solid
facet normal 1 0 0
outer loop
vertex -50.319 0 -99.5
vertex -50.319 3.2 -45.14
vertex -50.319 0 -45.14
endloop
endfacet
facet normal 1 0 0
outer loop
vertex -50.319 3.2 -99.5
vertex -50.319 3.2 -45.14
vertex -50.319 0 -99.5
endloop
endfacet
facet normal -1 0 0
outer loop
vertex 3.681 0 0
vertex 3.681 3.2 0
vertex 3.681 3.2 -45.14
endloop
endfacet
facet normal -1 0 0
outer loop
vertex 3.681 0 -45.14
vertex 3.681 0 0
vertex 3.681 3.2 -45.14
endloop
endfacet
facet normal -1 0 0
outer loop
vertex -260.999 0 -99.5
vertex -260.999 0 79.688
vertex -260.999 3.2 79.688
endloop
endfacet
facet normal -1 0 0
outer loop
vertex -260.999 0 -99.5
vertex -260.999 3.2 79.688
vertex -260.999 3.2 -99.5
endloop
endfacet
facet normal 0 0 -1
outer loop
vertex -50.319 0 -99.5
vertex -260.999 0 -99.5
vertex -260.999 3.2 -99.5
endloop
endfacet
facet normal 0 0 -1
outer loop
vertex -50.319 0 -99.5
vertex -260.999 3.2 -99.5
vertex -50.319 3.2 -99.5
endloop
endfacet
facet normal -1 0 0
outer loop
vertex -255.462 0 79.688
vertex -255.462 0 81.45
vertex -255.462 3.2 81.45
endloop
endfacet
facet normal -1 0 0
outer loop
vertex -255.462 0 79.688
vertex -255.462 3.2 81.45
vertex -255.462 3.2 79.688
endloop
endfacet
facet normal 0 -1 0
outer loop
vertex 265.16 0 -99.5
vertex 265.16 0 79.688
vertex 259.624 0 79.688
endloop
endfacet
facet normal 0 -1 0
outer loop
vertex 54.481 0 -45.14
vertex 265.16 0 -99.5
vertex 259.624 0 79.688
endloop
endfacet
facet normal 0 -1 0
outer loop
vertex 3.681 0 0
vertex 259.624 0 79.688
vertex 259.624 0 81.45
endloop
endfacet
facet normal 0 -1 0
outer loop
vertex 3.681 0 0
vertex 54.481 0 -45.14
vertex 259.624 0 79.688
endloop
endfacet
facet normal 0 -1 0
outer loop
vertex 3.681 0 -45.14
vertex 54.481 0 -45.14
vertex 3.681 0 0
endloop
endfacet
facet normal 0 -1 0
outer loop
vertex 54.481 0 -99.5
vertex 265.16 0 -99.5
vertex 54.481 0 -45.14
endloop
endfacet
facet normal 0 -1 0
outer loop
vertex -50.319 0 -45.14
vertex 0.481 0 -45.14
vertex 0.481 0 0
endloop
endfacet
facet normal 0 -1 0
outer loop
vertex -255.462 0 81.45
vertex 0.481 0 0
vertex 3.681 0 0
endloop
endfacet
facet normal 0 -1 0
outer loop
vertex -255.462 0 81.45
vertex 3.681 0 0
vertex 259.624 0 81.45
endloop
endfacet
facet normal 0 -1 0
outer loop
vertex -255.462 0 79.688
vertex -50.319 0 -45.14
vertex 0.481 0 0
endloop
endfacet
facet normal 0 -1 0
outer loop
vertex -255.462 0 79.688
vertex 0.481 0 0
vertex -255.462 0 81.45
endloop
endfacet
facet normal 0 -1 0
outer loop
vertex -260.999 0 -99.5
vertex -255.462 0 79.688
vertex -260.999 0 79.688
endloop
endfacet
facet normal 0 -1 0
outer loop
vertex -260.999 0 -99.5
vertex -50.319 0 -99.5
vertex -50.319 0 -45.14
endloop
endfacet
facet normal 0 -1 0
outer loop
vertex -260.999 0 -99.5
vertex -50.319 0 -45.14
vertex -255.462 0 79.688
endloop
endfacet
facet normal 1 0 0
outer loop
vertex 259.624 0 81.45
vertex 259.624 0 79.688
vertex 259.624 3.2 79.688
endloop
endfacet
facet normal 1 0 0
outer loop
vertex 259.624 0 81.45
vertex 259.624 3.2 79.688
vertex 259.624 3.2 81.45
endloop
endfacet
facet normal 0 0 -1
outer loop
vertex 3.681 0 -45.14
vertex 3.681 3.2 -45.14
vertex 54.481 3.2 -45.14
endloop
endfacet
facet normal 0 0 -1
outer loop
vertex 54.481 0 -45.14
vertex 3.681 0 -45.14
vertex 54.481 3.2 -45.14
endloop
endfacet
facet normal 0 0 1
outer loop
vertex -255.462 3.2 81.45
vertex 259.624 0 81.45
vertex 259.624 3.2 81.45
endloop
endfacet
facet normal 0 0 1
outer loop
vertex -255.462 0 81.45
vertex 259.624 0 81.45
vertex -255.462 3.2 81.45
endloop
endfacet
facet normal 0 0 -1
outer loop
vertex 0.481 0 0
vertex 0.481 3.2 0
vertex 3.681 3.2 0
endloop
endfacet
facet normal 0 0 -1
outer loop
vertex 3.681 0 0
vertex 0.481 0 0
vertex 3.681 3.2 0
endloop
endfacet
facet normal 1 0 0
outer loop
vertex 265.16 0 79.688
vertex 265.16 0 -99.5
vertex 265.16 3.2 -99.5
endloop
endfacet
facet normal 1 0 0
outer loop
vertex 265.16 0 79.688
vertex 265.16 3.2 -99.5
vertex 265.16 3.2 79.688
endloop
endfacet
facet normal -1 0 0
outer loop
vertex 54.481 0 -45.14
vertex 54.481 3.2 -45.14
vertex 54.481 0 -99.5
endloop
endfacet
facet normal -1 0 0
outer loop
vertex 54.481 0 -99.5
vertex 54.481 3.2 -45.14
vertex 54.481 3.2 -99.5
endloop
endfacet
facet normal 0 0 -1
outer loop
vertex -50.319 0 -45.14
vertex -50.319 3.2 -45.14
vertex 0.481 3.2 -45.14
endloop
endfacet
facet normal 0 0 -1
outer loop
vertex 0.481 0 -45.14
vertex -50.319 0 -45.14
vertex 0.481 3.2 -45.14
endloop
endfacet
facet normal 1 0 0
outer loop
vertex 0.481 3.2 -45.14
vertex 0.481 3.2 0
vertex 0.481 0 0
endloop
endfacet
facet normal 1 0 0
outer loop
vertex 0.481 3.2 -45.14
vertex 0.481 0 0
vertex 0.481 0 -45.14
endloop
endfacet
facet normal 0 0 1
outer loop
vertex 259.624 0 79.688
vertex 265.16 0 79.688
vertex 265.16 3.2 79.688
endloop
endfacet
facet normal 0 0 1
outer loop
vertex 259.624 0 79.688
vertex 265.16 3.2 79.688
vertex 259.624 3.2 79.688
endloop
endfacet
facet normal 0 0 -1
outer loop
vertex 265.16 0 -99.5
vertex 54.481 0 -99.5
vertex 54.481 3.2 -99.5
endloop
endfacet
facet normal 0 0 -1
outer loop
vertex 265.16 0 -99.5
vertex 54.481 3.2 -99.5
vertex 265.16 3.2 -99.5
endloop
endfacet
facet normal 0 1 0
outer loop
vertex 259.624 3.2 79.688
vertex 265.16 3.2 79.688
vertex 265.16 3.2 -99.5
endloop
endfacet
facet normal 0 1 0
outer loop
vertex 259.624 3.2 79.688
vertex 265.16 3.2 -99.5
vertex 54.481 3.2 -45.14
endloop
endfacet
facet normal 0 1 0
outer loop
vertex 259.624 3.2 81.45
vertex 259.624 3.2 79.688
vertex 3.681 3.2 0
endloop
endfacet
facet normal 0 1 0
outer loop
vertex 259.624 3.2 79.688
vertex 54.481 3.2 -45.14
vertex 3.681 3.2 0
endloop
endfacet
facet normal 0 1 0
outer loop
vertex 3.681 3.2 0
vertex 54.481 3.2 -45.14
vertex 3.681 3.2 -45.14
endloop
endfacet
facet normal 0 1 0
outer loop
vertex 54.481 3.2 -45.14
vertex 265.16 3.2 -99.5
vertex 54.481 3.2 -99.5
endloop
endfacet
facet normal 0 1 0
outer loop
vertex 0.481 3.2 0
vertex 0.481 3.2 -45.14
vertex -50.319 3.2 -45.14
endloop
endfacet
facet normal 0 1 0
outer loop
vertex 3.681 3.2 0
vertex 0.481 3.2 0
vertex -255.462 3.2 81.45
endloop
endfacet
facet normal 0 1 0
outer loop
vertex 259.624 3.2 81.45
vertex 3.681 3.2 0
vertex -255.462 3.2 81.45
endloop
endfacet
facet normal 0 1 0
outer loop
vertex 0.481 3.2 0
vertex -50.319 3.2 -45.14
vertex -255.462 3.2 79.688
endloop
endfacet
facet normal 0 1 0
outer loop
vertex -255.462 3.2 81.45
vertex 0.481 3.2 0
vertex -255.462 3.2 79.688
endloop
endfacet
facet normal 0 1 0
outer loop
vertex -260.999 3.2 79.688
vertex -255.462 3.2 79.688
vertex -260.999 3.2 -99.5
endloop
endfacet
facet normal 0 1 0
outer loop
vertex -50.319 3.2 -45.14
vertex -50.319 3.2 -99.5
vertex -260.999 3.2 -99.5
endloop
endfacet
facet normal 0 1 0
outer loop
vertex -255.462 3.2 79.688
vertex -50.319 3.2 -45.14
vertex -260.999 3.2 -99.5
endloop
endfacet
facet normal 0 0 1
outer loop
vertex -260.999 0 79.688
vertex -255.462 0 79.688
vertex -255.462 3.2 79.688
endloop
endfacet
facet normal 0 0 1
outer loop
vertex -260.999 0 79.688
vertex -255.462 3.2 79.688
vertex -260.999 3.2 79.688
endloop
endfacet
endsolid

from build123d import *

# Parameters (mm, degrees)
BOSS_EXTRUDE1_DEPTH = 3.2
SKETCH11_W          = 3.2
SKETCH11_H          = 199.000000018
CUT_EXTRUDE1_DEPTH  = 284.232260808
SKETCH13_W          = 50.8
SKETCH13_H          = 54.36
CUT_EXTRUDE3_DEPTH  = 284.232260808


with BuildPart() as part:
    # Sketch1 → Boss-Extrude1 (new body)
    with BuildSketch(Plane(origin=(0, 0, 0), x_dir=(1, 0, 0), z_dir=(0, 1, 0))):
        Polygon((265.160373285, -79.687626629), (259.623773233, -79.687626629), (259.623773233, -81.450000041), (-255.462493265, -81.450000041), (-255.462493265, -79.687626629), (-260.999093317, -79.687626629), (-260.999093317, 99.500000009), (265.160373285, 99.500000009), align=None)
    extrude(amount=BOSS_EXTRUDE1_DEPTH)

    # Sketch11 → Cut-Extrude1 (cut, through all)
    with BuildSketch(Plane(origin=(0, 3.2, 0), x_dir=(1, 0, 0), z_dir=(0, 1, 0))):
        with Locations((2.080639984, 99.500000009)):
            Rectangle(SKETCH11_W, SKETCH11_H)
    extrude(amount=-CUT_EXTRUDE1_DEPTH, mode=Mode.SUBTRACT)

    # Sketch13 → Cut-Extrude3 (cut, through all)
    with BuildSketch(Plane(origin=(0, 3.2, 0), x_dir=(1, 0, 0), z_dir=(0, 1, 0))):
        with Locations((-24.919360016, 72.320000009)):
            Rectangle(SKETCH13_W, SKETCH13_H)
        with Locations((29.080639984, 72.320000009)):
            Rectangle(SKETCH13_W, SKETCH13_H)
    extrude(amount=-CUT_EXTRUDE3_DEPTH, mode=Mode.SUBTRACT)


solid = part.part
